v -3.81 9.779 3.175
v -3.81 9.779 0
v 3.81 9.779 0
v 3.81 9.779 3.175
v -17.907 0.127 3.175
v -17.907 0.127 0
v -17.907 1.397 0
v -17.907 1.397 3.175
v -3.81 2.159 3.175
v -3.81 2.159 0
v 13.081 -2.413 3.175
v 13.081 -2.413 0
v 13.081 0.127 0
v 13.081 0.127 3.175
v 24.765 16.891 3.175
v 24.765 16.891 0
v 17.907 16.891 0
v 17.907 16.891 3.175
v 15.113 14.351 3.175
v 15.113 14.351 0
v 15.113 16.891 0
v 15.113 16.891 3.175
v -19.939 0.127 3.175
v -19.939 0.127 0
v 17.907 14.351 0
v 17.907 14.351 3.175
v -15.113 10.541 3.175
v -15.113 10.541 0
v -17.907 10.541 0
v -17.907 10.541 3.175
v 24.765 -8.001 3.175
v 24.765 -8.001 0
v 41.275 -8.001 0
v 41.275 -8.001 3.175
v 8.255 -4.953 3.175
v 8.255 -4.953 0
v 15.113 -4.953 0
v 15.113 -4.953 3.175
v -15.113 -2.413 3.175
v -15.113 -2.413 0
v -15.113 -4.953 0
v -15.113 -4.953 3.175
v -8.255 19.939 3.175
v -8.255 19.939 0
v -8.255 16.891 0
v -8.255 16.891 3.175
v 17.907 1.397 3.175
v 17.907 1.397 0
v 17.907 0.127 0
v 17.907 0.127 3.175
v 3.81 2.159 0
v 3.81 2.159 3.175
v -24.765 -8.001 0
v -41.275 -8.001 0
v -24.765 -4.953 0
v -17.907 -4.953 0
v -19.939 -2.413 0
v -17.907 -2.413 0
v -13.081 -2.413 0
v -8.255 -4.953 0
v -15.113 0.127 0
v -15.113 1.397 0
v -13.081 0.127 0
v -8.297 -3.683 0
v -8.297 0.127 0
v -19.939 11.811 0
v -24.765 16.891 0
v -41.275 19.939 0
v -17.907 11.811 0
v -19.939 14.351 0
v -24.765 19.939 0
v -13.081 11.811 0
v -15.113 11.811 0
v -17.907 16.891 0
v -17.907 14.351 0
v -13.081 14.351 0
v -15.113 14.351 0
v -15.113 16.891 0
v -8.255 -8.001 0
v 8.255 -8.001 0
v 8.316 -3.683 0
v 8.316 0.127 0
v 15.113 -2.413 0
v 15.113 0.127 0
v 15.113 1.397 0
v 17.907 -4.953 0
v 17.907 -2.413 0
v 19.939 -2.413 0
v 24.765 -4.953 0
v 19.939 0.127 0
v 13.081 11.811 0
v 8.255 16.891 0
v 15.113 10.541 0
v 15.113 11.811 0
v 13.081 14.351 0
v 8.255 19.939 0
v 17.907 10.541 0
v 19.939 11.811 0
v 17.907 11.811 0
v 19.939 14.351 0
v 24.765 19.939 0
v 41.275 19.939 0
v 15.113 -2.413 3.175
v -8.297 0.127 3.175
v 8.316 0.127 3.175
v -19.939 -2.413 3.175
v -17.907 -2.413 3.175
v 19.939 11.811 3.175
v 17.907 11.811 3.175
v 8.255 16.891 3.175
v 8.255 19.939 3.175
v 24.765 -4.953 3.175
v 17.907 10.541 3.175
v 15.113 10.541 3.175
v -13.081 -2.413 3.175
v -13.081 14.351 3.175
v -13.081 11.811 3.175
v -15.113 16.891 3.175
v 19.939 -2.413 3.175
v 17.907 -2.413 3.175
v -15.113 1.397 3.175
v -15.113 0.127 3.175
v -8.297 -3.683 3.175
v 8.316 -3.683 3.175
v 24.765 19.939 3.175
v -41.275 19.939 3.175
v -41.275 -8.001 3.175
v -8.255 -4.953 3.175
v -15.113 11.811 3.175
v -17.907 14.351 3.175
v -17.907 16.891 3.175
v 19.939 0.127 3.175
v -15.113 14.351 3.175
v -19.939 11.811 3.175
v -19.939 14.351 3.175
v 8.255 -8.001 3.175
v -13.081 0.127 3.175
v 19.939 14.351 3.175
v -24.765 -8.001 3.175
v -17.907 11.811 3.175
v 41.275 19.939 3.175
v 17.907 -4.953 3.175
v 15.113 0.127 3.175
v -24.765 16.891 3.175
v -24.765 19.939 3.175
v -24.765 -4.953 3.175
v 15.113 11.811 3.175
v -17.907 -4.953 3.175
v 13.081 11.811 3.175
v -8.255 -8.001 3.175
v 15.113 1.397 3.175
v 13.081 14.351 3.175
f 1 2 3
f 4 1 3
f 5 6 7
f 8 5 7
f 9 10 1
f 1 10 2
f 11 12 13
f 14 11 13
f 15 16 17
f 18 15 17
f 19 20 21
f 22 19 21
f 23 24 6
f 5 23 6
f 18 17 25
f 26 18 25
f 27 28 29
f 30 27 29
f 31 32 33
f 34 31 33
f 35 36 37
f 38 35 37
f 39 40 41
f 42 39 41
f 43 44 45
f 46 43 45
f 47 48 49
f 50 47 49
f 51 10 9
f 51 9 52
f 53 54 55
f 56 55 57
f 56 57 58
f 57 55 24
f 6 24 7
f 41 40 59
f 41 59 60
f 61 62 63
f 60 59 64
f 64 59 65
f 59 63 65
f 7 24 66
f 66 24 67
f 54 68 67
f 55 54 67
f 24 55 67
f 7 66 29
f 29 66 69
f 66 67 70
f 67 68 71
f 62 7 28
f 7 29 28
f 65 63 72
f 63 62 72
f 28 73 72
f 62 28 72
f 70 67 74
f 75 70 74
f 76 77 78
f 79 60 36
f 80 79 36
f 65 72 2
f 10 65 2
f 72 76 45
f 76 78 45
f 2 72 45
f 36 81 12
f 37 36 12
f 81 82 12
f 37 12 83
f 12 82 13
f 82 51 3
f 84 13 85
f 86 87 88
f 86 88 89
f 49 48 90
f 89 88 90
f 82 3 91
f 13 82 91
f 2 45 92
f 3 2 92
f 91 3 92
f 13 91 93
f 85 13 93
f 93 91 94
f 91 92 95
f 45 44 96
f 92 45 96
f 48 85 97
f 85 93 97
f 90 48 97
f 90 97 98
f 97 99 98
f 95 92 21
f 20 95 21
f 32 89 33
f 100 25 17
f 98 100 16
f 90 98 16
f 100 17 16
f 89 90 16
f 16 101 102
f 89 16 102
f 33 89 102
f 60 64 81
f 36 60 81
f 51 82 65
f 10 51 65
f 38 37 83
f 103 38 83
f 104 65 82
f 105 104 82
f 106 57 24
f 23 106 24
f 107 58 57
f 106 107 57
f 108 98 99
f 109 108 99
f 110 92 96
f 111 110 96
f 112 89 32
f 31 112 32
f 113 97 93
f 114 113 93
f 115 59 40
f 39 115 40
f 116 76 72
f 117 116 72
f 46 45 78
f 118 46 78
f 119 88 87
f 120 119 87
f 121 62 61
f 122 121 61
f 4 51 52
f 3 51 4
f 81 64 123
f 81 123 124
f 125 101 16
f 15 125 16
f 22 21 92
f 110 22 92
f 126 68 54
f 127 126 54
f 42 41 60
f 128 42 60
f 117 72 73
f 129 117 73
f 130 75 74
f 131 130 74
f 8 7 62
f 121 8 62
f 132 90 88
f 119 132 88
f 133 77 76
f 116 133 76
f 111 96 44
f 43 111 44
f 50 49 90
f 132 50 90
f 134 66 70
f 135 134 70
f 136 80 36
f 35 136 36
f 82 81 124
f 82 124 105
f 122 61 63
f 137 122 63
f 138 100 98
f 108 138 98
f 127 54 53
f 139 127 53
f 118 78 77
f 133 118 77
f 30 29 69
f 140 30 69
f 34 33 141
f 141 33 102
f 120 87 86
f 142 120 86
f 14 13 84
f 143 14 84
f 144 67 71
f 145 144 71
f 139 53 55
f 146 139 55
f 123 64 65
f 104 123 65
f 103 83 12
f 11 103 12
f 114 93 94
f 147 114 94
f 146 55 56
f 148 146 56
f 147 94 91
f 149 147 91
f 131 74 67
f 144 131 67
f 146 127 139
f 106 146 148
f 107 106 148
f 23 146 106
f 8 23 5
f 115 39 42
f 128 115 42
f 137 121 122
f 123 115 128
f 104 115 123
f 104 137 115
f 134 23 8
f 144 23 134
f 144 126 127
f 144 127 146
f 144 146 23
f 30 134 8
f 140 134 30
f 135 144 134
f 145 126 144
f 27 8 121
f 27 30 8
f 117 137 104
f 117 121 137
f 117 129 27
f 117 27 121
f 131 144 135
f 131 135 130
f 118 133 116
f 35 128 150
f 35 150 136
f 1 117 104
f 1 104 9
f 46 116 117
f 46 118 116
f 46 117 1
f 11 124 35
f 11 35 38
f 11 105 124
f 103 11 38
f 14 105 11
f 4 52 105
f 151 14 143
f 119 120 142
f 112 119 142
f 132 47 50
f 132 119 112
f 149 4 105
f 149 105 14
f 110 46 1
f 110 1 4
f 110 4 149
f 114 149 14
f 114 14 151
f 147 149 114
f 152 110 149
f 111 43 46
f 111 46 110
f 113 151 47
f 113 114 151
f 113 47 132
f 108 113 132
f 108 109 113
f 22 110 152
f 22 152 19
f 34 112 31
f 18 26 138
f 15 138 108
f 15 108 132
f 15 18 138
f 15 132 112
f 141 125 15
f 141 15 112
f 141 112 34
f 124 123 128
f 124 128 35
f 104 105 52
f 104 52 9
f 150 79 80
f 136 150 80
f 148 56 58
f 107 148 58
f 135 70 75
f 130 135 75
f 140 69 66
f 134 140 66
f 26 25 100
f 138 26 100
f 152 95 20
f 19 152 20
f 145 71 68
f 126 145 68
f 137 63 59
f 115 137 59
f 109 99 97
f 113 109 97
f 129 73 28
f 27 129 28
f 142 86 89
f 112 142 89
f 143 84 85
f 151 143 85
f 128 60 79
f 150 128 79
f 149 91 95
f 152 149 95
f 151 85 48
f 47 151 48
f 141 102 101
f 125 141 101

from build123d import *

# Parameters (mm, degrees)
F0_W     = 16.6126135737
F0_H     = 3.81
F0_W_2   = 7.62
F0_H_2   = 7.62
F1_DEPTH = 3.175


# Not quite as in the source:
# - a length typed as a fraction of an inch, garbled in the dataset ("3 / 203.2 mm" for 3/8 in), is restored
# - a feature names something its author has since deleted; it is built from what else it names


with BuildPart() as f1:
    # F0 (on Top) → F1 (new body)
    with BuildSketch(Plane.XY):
        Polygon((24.765, -8.001), (41.275, -8.001), (41.275, 19.939), (24.765, 19.939), (24.765, 16.891), (17.907, 16.891), (17.907, 14.351), (19.939, 14.351), (19.939, 11.811), (17.907, 11.811), (17.907, 10.541), (15.113, 10.541), (15.113, 11.811), (13.081, 11.811), (13.081, 14.351), (15.113, 14.351), (15.113, 16.891), (8.255, 16.891), (8.255, 19.939), (-8.255, 19.939), (-8.255, 16.891), (-15.113, 16.891), (-15.113, 14.351), (-13.081, 14.351), (-13.081, 11.811), (-15.113, 11.811), (-15.113, 10.541), (-17.907, 10.541), (-17.907, 11.811), (-19.939, 11.811), (-19.939, 14.351), (-17.907, 14.351), (-17.907, 16.891), (-24.765, 16.891), (-24.765, 19.939), (-41.275, 19.939), (-41.275, -8.001), (-24.765, -8.001), (-24.765, -4.953), (-17.907, -4.953), (-17.907, -2.413), (-19.939, -2.413), (-19.939, 0.127), (-17.907, 0.127), (-17.907, 1.397), (-15.113, 1.397), (-15.113, 0.127), (-13.081, 0.127), (-13.081, -2.413), (-15.113, -2.413), (-15.113, -4.953), (-8.255, -4.953), (-8.255, -8.001), (8.255, -8.001), (8.255, -4.953), (15.113, -4.953), (15.113, -2.413), (13.081, -2.413), (13.081, 0.127), (15.113, 0.127), (15.113, 1.397), (17.907, 1.397), (17.907, 0.127), (19.939, 0.127), (19.939, -2.413), (17.907, -2.413), (17.907, -4.953), (24.765, -4.953), align=None)
        with Locations((0.0095833093, -1.778)):
            Rectangle(F0_W, F0_H, mode=Mode.SUBTRACT)
        with Locations((0, 5.969)):
            Rectangle(F0_W_2, F0_H_2, mode=Mode.SUBTRACT)
    extrude(amount=F1_DEPTH)


solid = f1.part
